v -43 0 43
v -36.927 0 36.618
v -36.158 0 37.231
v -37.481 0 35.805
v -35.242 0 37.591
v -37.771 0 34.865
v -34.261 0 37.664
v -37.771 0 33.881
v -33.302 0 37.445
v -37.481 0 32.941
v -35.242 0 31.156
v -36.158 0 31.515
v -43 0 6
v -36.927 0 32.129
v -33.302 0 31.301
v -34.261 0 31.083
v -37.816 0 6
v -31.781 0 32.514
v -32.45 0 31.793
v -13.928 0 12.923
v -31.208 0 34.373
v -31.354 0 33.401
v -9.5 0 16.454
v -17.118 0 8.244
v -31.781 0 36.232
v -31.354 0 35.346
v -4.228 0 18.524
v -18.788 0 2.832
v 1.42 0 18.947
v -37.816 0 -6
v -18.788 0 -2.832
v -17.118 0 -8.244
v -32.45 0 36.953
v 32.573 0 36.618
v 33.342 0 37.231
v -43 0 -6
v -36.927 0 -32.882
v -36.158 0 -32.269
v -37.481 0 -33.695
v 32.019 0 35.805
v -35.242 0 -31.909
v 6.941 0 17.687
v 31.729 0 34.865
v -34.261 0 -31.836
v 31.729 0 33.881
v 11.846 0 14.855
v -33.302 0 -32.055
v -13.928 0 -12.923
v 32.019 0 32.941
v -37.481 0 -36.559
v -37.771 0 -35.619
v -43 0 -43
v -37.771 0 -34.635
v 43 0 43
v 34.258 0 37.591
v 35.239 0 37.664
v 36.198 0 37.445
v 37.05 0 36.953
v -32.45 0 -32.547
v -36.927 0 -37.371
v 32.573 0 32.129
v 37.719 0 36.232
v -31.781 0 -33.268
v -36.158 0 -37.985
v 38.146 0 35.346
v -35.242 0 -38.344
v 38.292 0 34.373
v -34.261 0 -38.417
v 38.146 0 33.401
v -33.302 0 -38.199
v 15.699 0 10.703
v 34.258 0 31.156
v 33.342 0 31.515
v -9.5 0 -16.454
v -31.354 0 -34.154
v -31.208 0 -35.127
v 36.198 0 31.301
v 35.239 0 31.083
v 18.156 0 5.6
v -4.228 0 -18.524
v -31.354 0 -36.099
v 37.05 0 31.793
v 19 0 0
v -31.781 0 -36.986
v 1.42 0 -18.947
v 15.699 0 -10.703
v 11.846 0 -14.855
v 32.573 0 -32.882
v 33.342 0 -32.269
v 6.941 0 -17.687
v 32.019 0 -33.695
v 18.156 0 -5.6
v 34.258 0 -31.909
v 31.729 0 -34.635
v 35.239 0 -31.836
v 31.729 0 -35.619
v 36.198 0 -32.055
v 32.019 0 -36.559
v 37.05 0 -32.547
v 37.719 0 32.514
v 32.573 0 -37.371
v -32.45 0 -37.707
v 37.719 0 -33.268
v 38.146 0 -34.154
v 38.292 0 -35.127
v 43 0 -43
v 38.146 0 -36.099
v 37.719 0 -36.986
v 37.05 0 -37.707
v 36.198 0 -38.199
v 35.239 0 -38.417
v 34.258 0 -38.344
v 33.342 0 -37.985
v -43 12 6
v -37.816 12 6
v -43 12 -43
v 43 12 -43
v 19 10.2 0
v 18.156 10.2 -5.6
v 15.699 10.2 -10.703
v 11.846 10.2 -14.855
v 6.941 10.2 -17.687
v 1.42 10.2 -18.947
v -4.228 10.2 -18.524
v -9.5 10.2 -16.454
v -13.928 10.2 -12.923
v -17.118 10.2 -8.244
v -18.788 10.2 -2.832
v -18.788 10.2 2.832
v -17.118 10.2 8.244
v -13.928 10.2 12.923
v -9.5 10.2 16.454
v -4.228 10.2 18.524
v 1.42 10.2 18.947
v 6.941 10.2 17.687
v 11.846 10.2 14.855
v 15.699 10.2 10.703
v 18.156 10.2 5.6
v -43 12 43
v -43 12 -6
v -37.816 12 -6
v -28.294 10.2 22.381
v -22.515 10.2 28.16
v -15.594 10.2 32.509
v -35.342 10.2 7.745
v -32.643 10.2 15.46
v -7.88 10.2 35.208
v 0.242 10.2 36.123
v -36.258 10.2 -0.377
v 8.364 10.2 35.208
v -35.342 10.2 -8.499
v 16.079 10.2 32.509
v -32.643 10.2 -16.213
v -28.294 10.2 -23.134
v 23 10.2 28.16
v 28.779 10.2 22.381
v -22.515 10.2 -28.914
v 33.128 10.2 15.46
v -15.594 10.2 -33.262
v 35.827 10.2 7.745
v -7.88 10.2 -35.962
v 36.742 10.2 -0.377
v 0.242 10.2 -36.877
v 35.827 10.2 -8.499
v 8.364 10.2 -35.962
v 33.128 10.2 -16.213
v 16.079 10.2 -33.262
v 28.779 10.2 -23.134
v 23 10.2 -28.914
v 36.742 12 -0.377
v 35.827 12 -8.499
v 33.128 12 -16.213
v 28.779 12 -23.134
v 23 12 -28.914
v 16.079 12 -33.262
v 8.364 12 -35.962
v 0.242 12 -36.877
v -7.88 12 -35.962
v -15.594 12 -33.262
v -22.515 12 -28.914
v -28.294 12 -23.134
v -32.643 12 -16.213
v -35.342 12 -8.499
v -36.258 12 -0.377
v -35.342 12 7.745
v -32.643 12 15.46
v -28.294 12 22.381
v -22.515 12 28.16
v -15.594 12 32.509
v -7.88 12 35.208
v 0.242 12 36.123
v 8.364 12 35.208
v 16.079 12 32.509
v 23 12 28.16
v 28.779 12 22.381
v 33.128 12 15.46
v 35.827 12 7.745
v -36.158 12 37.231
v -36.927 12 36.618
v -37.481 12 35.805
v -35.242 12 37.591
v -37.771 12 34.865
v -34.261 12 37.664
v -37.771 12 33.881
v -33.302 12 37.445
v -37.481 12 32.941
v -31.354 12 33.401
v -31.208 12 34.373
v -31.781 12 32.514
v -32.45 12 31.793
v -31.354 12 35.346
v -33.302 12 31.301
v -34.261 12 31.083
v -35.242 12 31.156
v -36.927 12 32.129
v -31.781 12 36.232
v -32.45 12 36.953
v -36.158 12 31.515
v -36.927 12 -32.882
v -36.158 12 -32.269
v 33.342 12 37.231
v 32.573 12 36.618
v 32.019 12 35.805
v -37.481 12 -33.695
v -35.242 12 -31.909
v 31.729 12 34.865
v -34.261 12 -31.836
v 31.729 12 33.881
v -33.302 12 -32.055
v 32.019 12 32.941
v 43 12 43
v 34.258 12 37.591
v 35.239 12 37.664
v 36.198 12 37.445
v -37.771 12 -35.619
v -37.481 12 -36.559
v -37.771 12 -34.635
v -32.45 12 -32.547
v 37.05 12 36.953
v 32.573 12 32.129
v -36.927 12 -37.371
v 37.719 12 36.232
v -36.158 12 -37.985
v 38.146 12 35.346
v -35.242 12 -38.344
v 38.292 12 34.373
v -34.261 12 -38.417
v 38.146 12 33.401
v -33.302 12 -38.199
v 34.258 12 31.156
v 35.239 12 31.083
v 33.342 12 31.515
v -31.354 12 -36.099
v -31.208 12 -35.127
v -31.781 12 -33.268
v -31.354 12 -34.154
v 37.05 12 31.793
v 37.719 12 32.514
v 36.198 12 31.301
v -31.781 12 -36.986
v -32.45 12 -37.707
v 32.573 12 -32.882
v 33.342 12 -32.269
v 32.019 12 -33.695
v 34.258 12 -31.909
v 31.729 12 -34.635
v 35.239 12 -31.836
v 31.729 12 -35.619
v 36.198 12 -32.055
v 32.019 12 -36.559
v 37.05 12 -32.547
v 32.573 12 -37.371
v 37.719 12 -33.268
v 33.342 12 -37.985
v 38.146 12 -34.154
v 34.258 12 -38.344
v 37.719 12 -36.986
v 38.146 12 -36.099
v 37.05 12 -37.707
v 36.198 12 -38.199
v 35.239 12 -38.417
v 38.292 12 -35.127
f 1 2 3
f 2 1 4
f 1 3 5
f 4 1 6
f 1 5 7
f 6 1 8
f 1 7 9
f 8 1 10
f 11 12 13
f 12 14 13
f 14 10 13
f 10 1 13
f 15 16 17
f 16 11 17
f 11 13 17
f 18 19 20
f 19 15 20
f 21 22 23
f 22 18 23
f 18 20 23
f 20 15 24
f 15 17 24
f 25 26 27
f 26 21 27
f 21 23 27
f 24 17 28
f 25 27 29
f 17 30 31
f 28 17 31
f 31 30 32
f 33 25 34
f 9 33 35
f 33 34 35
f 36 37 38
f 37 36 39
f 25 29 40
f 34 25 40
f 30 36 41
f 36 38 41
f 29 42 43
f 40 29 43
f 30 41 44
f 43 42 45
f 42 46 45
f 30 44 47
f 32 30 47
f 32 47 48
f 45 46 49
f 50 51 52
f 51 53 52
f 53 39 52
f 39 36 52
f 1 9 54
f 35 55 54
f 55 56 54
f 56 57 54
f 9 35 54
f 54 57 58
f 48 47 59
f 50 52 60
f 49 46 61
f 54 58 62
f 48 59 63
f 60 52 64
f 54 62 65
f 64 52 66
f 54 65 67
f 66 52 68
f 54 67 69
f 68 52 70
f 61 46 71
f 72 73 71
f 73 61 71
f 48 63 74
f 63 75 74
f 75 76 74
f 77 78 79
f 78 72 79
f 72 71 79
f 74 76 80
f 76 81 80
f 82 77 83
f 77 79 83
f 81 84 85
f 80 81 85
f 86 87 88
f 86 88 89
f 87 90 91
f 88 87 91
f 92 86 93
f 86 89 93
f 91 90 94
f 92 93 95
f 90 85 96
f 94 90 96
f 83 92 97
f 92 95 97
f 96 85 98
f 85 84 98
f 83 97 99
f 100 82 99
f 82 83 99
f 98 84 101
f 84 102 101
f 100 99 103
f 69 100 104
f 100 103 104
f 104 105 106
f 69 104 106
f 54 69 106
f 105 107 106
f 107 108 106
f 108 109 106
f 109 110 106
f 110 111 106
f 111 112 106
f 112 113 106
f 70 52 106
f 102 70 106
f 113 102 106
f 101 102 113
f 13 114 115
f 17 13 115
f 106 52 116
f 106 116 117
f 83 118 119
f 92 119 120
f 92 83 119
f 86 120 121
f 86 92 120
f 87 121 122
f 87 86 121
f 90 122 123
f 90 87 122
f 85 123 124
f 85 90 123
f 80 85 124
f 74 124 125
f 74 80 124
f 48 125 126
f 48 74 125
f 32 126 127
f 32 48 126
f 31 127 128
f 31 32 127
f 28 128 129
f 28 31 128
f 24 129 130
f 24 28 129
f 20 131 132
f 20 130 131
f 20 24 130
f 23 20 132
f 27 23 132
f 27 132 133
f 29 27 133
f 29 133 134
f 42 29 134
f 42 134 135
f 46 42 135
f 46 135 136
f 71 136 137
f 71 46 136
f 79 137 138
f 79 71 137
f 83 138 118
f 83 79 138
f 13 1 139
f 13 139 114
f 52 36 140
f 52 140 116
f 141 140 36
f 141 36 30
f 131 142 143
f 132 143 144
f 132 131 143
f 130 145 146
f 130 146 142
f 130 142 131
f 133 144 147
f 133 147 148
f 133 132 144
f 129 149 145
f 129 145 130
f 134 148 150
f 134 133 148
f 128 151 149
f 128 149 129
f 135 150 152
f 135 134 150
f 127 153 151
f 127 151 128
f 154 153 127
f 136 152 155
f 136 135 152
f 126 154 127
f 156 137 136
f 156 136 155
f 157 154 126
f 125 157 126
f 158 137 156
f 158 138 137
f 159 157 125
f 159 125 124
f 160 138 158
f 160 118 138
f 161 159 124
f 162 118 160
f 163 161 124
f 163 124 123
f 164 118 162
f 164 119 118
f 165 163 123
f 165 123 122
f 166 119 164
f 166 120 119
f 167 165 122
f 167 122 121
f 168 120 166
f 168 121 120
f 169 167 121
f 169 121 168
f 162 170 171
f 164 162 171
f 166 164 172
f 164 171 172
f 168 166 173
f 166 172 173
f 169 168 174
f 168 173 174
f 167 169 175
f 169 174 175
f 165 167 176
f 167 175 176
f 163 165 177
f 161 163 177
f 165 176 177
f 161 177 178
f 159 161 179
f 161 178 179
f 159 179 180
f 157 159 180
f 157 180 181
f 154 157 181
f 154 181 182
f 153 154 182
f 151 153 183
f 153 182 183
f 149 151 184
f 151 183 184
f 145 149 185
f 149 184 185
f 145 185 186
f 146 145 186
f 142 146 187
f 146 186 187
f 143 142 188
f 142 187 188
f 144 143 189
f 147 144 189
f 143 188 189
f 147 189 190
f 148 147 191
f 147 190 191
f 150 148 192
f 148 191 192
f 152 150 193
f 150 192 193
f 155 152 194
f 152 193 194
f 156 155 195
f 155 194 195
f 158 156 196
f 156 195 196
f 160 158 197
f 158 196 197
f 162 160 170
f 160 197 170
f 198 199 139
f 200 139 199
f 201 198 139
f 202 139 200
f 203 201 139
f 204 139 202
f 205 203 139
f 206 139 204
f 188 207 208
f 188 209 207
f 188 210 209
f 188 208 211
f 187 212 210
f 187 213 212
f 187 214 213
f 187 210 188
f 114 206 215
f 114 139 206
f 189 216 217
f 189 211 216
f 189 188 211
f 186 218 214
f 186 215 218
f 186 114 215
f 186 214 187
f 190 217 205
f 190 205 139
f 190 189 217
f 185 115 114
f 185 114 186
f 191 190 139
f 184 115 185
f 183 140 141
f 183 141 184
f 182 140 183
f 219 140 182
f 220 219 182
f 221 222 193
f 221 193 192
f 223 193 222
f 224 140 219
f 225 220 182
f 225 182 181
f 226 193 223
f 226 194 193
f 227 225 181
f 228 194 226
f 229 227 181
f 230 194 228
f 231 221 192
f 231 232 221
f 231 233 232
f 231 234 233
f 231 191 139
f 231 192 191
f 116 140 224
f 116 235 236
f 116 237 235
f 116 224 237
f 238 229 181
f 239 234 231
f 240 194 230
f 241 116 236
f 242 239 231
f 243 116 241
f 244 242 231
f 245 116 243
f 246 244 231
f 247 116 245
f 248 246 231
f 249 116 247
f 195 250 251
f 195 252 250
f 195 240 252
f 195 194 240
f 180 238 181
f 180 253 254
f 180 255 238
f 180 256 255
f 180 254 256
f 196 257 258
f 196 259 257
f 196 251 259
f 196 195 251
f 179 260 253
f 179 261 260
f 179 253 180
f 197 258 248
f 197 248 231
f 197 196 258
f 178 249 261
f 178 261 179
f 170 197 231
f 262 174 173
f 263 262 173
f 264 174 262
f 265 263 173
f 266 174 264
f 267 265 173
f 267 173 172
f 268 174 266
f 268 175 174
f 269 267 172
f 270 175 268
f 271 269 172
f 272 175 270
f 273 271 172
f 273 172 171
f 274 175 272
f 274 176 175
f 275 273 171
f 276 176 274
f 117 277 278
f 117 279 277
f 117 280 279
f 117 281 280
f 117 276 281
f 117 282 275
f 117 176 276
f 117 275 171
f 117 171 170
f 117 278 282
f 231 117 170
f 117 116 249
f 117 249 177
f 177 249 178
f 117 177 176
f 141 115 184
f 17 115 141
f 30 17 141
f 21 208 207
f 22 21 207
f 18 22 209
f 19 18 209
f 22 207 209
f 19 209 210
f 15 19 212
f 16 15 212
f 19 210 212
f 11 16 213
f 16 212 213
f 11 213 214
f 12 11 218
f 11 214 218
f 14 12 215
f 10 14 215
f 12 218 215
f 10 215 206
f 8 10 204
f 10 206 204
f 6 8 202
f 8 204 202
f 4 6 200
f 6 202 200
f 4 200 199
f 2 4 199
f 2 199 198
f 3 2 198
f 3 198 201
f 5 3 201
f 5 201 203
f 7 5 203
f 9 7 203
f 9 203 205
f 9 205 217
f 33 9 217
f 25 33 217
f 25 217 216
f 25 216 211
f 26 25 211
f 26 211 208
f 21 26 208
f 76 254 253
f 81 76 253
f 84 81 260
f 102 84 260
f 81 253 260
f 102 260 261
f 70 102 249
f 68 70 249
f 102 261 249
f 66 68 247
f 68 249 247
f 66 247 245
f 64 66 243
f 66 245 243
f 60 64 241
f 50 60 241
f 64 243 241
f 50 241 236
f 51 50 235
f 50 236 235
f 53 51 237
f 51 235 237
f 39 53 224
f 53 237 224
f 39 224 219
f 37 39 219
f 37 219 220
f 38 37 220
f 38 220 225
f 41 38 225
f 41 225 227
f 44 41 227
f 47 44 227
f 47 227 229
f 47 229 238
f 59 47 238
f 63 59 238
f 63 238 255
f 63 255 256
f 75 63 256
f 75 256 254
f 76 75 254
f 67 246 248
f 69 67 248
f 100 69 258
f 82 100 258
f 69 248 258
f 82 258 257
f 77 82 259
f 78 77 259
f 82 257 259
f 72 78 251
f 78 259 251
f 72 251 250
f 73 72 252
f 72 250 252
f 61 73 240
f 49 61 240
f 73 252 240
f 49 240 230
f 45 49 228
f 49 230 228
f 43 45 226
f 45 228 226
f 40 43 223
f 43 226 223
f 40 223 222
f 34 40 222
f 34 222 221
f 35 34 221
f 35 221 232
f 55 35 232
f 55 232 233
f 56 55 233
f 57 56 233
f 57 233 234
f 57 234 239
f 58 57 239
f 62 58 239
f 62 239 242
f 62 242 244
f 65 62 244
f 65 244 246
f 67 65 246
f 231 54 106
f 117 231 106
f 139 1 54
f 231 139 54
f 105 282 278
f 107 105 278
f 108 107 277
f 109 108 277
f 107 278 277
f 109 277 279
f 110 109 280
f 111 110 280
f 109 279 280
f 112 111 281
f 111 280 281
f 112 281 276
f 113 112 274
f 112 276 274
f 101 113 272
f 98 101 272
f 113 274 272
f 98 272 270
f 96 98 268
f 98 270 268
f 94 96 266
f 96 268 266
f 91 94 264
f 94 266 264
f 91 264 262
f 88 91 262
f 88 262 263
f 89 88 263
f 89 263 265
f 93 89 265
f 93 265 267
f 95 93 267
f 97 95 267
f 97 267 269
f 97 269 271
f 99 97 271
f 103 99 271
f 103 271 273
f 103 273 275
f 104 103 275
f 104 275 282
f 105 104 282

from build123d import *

# Parameters (mm, degrees)
SKETCH1_W           = 86
SKETCH1_H           = 86
SKETCH1_R           = 19
BOSS_EXTRUDE1_DEPTH = 12
CUT_EXTRUDE1_REACH  = 14
SKETCH2_R           = 3.3
SKETCH4_R           = 36.5
CUT_EXTRUDE2_DEPTH  = 1.8
SKETCH6_W           = 8.07061303
SKETCH6_H           = 12
CUT_EXTRUDE3_DEPTH  = 13


with BuildPart() as part:
    # Sketch1 → Boss-Extrude1 (new body)
    with BuildSketch(Plane(origin=(0, 0, 0), x_dir=(1, 0, 0), z_dir=(0, 1, 0))):
        Rectangle(SKETCH1_W, SKETCH1_H)
        Circle(SKETCH1_R, mode=Mode.SUBTRACT)
    extrude(amount=BOSS_EXTRUDE1_DEPTH)

    # Sketch2 → Cut-Extrude1 (cut, up to next)
    with BuildSketch(Plane(origin=(0, 12, 0), x_dir=(1, 0, 0), z_dir=(0, 1, 0)), mode=Mode.PRIVATE) as cut_extrude1_sk1:
        with Locations((-34.507589913, -34.373280458)):
            Circle(SKETCH2_R)
    cut_extrude1_tool1 = extrude(cut_extrude1_sk1.sketch, amount=-CUT_EXTRUDE1_REACH, mode=Mode.PRIVATE) & part.part
    add(cut_extrude1_tool1.solids().sort_by_distance((-34.50759, 12, 34.37328))[0], mode=Mode.SUBTRACT)
    # Sketch2 → Cut-Extrude1 (cut, up to next)
    with BuildSketch(Plane(origin=(0, 12, 0), x_dir=(1, 0, 0), z_dir=(0, 1, 0)), mode=Mode.PRIVATE) as cut_extrude1_sk2:
        with Locations((-34.507589913, 35.126719542)):
            Circle(SKETCH2_R)
    cut_extrude1_tool2 = extrude(cut_extrude1_sk2.sketch, amount=-CUT_EXTRUDE1_REACH, mode=Mode.PRIVATE) & part.part
    add(cut_extrude1_tool2.solids().sort_by_distance((-34.50759, 12, -35.12672))[0], mode=Mode.SUBTRACT)
    # Sketch2 → Cut-Extrude1 (cut, up to next)
    with BuildSketch(Plane(origin=(0, 12, 0), x_dir=(1, 0, 0), z_dir=(0, 1, 0)), mode=Mode.PRIVATE) as cut_extrude1_sk3:
        with Locations((34.992410087, -34.373280458)):
            Circle(SKETCH2_R)
    cut_extrude1_tool3 = extrude(cut_extrude1_sk3.sketch, amount=-CUT_EXTRUDE1_REACH, mode=Mode.PRIVATE) & part.part
    add(cut_extrude1_tool3.solids().sort_by_distance((34.99241, 12, 34.37328))[0], mode=Mode.SUBTRACT)
    # Sketch2 → Cut-Extrude1 (cut, up to next)
    with BuildSketch(Plane(origin=(0, 12, 0), x_dir=(1, 0, 0), z_dir=(0, 1, 0)), mode=Mode.PRIVATE) as cut_extrude1_sk4:
        with Locations((34.992410087, 35.126719542)):
            Circle(SKETCH2_R)
    cut_extrude1_tool4 = extrude(cut_extrude1_sk4.sketch, amount=-CUT_EXTRUDE1_REACH, mode=Mode.PRIVATE) & part.part
    add(cut_extrude1_tool4.solids().sort_by_distance((34.99241, 12, -35.12672))[0], mode=Mode.SUBTRACT)

    # Sketch4 → Cut-Extrude2 (cut)
    with BuildSketch(Plane(origin=(0, 12, 0), x_dir=(1, 0, 0), z_dir=(0, 1, 0))):
        with Locations((0.242410087, 0.376719542)):
            Circle(SKETCH4_R)
    extrude(amount=-CUT_EXTRUDE2_DEPTH, mode=Mode.SUBTRACT)

    # Sketch6 → Cut-Extrude3 (cut, through all)
    with BuildSketch(Plane(origin=(0, 12, 0), x_dir=(1, 0, 0), z_dir=(0, 1, 0))):
        with Locations((-41.851719536, 0)):
            Rectangle(SKETCH6_W, SKETCH6_H)
    extrude(amount=-CUT_EXTRUDE3_DEPTH, mode=Mode.SUBTRACT)


solid = part.part
